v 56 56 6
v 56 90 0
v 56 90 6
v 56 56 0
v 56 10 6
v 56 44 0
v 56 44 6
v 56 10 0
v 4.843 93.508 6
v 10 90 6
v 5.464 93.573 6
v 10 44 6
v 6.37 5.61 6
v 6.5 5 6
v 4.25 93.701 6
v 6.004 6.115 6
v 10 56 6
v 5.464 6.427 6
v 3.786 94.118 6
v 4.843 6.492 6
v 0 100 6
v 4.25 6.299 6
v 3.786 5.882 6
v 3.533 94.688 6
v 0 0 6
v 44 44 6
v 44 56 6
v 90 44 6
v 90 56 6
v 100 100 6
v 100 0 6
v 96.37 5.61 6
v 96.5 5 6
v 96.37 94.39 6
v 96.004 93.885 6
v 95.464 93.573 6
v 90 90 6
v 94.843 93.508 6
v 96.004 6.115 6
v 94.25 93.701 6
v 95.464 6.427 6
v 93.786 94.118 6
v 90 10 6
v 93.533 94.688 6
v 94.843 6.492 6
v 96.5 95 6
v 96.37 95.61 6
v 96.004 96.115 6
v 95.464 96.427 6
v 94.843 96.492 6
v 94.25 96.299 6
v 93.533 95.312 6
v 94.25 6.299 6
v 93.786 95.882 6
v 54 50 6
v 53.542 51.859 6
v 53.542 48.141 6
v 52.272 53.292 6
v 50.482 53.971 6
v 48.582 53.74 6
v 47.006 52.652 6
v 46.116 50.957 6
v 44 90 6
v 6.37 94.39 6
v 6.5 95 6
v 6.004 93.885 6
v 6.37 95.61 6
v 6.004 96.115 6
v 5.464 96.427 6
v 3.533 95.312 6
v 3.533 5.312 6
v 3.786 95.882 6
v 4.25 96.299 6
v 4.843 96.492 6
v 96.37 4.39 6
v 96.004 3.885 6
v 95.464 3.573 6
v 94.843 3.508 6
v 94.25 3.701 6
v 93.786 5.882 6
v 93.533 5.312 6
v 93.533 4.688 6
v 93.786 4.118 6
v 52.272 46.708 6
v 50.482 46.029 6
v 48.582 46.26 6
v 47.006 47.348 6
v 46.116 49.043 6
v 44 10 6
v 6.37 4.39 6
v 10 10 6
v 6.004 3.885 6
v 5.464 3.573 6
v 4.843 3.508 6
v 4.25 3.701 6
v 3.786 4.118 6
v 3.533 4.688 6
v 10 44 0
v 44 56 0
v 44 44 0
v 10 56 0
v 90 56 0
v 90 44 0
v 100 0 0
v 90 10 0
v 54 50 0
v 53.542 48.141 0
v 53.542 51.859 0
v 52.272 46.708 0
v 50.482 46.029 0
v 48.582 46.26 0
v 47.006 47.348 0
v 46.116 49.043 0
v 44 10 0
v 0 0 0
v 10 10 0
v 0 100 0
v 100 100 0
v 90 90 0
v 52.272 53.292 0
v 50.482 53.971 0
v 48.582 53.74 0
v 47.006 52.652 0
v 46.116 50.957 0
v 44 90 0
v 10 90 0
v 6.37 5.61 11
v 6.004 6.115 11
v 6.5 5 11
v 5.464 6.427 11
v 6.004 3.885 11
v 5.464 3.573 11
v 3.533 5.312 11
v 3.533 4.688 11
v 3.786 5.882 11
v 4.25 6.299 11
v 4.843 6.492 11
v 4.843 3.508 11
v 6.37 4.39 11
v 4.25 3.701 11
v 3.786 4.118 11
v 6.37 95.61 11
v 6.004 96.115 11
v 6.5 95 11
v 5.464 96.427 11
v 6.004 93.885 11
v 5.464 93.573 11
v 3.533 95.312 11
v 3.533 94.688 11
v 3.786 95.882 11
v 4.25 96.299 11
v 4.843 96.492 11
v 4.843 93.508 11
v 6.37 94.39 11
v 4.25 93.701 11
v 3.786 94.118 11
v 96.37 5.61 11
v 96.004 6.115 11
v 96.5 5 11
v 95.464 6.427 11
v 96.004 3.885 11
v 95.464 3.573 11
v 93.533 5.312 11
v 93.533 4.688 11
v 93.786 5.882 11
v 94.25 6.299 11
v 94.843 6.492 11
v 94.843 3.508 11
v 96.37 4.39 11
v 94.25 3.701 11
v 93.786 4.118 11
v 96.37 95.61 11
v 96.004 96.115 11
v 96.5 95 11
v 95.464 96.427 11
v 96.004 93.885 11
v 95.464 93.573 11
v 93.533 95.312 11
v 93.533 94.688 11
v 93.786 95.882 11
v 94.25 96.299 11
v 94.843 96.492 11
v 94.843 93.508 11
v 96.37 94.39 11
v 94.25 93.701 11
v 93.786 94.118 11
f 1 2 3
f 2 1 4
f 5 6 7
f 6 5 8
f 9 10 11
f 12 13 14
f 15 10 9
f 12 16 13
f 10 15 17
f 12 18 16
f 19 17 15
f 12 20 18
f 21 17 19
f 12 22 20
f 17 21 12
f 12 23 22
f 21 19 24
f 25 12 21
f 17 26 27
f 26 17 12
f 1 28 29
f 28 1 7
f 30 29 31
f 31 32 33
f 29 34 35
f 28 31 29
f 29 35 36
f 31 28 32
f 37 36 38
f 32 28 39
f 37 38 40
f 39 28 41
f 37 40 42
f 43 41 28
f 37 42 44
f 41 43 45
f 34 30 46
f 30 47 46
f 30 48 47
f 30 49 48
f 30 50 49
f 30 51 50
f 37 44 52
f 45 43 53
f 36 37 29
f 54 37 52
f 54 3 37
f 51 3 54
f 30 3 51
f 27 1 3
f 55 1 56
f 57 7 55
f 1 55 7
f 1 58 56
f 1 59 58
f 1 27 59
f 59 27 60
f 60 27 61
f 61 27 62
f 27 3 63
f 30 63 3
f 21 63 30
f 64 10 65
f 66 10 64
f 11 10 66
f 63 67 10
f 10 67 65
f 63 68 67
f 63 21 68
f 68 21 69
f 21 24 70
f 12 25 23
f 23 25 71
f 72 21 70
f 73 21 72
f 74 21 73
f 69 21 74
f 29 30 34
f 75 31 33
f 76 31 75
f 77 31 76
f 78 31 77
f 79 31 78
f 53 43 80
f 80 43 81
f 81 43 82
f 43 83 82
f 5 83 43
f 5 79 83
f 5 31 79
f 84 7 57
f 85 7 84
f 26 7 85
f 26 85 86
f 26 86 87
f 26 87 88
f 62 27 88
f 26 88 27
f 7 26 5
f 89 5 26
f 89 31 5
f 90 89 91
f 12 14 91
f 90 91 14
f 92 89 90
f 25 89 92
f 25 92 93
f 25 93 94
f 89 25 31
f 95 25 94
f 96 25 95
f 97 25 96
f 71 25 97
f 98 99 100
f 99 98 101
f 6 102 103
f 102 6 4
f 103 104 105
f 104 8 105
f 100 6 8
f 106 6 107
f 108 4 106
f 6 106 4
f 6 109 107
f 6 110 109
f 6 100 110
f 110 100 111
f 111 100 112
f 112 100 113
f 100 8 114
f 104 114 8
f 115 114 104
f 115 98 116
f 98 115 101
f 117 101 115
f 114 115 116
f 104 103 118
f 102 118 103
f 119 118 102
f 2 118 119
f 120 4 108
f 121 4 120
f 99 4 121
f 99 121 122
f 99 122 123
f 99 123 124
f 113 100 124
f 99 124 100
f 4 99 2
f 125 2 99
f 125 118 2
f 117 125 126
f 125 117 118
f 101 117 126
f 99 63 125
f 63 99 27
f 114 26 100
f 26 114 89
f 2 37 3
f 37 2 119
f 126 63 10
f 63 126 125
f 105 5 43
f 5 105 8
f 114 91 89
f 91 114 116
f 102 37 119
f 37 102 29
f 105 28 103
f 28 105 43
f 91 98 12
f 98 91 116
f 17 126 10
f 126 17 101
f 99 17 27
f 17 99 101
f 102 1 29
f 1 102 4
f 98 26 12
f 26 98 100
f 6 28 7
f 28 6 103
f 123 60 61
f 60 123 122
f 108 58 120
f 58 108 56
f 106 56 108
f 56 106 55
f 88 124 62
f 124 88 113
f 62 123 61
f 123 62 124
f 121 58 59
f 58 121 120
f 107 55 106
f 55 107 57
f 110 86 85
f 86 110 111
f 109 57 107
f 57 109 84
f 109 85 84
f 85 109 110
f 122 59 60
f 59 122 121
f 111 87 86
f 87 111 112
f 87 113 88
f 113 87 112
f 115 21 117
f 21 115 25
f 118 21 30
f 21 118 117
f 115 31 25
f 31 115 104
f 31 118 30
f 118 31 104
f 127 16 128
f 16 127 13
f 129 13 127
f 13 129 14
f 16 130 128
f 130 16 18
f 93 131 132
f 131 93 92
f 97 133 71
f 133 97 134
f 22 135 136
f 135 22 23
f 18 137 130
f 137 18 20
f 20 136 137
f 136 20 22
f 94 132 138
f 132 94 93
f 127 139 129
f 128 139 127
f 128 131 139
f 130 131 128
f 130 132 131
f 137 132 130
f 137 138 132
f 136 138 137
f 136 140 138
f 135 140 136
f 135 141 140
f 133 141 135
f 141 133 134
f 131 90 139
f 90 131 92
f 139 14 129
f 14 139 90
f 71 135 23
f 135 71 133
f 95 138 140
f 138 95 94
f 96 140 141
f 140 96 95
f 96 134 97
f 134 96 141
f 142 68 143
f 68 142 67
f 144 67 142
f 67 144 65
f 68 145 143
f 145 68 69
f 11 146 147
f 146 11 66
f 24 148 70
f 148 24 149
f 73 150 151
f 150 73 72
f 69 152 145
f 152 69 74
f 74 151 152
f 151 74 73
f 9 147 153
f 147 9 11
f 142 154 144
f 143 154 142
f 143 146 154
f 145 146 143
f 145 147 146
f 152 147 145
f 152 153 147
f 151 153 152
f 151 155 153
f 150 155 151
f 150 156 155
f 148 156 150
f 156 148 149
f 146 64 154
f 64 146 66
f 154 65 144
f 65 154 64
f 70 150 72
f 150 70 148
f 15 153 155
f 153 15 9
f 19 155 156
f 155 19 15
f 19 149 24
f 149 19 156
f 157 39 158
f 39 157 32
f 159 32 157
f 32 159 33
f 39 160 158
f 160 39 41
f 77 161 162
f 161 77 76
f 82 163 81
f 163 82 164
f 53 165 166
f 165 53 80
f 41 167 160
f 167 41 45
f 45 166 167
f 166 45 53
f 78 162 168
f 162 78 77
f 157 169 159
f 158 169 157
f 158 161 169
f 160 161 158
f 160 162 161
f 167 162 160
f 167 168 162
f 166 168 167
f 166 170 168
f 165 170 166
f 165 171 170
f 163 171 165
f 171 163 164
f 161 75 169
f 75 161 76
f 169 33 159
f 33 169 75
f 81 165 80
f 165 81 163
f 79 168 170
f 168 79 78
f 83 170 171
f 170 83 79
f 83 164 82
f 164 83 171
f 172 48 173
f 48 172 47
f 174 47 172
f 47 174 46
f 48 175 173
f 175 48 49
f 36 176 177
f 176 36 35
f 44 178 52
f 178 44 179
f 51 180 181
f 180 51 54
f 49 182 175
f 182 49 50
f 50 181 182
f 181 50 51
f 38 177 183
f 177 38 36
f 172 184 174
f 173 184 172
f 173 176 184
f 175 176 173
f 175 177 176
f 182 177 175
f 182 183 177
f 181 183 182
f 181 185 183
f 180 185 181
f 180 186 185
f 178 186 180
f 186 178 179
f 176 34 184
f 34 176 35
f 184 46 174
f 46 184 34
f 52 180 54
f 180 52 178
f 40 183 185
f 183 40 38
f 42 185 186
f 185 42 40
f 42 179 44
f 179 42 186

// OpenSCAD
l = 100;
w = 10;
h = 20;
p = 15;
t = 6;
fn = 15;

cube([w,l,t]);
translate([w,0,0])cube([l-w,w,t]);
translate([l-w,w,0])cube([w,l-(2*w),t]);
translate([w,l-w,0])cube([l-w,w,t]);
// pegs
translate([w/2,w/2,t])cylinder(5,1.5,1.5,$fn = fn);
translate([0,l-w,0])translate([w/2,w/2,t])cylinder(5,1.5,1.5,$fn = fn);
translate([l-w,0,0])translate([w/2,w/2,t])cylinder(5,1.5,1.5,$fn = fn);
translate([l-w,l-w,0])translate([w/2,w/2,t])cylinder(5,1.5,1.5,$fn = fn);


// cross
difference(){
    
union(){
    translate([(l-w)/2-1,w,0])cube([w+2,l-(2*w),t]);
    translate([w,(l-w)/2-1,0])cube([l-(2*w),w+2,t]);
}
    translate([(l/2),(l/2),-1])cylinder(t+2,4,4);
}
